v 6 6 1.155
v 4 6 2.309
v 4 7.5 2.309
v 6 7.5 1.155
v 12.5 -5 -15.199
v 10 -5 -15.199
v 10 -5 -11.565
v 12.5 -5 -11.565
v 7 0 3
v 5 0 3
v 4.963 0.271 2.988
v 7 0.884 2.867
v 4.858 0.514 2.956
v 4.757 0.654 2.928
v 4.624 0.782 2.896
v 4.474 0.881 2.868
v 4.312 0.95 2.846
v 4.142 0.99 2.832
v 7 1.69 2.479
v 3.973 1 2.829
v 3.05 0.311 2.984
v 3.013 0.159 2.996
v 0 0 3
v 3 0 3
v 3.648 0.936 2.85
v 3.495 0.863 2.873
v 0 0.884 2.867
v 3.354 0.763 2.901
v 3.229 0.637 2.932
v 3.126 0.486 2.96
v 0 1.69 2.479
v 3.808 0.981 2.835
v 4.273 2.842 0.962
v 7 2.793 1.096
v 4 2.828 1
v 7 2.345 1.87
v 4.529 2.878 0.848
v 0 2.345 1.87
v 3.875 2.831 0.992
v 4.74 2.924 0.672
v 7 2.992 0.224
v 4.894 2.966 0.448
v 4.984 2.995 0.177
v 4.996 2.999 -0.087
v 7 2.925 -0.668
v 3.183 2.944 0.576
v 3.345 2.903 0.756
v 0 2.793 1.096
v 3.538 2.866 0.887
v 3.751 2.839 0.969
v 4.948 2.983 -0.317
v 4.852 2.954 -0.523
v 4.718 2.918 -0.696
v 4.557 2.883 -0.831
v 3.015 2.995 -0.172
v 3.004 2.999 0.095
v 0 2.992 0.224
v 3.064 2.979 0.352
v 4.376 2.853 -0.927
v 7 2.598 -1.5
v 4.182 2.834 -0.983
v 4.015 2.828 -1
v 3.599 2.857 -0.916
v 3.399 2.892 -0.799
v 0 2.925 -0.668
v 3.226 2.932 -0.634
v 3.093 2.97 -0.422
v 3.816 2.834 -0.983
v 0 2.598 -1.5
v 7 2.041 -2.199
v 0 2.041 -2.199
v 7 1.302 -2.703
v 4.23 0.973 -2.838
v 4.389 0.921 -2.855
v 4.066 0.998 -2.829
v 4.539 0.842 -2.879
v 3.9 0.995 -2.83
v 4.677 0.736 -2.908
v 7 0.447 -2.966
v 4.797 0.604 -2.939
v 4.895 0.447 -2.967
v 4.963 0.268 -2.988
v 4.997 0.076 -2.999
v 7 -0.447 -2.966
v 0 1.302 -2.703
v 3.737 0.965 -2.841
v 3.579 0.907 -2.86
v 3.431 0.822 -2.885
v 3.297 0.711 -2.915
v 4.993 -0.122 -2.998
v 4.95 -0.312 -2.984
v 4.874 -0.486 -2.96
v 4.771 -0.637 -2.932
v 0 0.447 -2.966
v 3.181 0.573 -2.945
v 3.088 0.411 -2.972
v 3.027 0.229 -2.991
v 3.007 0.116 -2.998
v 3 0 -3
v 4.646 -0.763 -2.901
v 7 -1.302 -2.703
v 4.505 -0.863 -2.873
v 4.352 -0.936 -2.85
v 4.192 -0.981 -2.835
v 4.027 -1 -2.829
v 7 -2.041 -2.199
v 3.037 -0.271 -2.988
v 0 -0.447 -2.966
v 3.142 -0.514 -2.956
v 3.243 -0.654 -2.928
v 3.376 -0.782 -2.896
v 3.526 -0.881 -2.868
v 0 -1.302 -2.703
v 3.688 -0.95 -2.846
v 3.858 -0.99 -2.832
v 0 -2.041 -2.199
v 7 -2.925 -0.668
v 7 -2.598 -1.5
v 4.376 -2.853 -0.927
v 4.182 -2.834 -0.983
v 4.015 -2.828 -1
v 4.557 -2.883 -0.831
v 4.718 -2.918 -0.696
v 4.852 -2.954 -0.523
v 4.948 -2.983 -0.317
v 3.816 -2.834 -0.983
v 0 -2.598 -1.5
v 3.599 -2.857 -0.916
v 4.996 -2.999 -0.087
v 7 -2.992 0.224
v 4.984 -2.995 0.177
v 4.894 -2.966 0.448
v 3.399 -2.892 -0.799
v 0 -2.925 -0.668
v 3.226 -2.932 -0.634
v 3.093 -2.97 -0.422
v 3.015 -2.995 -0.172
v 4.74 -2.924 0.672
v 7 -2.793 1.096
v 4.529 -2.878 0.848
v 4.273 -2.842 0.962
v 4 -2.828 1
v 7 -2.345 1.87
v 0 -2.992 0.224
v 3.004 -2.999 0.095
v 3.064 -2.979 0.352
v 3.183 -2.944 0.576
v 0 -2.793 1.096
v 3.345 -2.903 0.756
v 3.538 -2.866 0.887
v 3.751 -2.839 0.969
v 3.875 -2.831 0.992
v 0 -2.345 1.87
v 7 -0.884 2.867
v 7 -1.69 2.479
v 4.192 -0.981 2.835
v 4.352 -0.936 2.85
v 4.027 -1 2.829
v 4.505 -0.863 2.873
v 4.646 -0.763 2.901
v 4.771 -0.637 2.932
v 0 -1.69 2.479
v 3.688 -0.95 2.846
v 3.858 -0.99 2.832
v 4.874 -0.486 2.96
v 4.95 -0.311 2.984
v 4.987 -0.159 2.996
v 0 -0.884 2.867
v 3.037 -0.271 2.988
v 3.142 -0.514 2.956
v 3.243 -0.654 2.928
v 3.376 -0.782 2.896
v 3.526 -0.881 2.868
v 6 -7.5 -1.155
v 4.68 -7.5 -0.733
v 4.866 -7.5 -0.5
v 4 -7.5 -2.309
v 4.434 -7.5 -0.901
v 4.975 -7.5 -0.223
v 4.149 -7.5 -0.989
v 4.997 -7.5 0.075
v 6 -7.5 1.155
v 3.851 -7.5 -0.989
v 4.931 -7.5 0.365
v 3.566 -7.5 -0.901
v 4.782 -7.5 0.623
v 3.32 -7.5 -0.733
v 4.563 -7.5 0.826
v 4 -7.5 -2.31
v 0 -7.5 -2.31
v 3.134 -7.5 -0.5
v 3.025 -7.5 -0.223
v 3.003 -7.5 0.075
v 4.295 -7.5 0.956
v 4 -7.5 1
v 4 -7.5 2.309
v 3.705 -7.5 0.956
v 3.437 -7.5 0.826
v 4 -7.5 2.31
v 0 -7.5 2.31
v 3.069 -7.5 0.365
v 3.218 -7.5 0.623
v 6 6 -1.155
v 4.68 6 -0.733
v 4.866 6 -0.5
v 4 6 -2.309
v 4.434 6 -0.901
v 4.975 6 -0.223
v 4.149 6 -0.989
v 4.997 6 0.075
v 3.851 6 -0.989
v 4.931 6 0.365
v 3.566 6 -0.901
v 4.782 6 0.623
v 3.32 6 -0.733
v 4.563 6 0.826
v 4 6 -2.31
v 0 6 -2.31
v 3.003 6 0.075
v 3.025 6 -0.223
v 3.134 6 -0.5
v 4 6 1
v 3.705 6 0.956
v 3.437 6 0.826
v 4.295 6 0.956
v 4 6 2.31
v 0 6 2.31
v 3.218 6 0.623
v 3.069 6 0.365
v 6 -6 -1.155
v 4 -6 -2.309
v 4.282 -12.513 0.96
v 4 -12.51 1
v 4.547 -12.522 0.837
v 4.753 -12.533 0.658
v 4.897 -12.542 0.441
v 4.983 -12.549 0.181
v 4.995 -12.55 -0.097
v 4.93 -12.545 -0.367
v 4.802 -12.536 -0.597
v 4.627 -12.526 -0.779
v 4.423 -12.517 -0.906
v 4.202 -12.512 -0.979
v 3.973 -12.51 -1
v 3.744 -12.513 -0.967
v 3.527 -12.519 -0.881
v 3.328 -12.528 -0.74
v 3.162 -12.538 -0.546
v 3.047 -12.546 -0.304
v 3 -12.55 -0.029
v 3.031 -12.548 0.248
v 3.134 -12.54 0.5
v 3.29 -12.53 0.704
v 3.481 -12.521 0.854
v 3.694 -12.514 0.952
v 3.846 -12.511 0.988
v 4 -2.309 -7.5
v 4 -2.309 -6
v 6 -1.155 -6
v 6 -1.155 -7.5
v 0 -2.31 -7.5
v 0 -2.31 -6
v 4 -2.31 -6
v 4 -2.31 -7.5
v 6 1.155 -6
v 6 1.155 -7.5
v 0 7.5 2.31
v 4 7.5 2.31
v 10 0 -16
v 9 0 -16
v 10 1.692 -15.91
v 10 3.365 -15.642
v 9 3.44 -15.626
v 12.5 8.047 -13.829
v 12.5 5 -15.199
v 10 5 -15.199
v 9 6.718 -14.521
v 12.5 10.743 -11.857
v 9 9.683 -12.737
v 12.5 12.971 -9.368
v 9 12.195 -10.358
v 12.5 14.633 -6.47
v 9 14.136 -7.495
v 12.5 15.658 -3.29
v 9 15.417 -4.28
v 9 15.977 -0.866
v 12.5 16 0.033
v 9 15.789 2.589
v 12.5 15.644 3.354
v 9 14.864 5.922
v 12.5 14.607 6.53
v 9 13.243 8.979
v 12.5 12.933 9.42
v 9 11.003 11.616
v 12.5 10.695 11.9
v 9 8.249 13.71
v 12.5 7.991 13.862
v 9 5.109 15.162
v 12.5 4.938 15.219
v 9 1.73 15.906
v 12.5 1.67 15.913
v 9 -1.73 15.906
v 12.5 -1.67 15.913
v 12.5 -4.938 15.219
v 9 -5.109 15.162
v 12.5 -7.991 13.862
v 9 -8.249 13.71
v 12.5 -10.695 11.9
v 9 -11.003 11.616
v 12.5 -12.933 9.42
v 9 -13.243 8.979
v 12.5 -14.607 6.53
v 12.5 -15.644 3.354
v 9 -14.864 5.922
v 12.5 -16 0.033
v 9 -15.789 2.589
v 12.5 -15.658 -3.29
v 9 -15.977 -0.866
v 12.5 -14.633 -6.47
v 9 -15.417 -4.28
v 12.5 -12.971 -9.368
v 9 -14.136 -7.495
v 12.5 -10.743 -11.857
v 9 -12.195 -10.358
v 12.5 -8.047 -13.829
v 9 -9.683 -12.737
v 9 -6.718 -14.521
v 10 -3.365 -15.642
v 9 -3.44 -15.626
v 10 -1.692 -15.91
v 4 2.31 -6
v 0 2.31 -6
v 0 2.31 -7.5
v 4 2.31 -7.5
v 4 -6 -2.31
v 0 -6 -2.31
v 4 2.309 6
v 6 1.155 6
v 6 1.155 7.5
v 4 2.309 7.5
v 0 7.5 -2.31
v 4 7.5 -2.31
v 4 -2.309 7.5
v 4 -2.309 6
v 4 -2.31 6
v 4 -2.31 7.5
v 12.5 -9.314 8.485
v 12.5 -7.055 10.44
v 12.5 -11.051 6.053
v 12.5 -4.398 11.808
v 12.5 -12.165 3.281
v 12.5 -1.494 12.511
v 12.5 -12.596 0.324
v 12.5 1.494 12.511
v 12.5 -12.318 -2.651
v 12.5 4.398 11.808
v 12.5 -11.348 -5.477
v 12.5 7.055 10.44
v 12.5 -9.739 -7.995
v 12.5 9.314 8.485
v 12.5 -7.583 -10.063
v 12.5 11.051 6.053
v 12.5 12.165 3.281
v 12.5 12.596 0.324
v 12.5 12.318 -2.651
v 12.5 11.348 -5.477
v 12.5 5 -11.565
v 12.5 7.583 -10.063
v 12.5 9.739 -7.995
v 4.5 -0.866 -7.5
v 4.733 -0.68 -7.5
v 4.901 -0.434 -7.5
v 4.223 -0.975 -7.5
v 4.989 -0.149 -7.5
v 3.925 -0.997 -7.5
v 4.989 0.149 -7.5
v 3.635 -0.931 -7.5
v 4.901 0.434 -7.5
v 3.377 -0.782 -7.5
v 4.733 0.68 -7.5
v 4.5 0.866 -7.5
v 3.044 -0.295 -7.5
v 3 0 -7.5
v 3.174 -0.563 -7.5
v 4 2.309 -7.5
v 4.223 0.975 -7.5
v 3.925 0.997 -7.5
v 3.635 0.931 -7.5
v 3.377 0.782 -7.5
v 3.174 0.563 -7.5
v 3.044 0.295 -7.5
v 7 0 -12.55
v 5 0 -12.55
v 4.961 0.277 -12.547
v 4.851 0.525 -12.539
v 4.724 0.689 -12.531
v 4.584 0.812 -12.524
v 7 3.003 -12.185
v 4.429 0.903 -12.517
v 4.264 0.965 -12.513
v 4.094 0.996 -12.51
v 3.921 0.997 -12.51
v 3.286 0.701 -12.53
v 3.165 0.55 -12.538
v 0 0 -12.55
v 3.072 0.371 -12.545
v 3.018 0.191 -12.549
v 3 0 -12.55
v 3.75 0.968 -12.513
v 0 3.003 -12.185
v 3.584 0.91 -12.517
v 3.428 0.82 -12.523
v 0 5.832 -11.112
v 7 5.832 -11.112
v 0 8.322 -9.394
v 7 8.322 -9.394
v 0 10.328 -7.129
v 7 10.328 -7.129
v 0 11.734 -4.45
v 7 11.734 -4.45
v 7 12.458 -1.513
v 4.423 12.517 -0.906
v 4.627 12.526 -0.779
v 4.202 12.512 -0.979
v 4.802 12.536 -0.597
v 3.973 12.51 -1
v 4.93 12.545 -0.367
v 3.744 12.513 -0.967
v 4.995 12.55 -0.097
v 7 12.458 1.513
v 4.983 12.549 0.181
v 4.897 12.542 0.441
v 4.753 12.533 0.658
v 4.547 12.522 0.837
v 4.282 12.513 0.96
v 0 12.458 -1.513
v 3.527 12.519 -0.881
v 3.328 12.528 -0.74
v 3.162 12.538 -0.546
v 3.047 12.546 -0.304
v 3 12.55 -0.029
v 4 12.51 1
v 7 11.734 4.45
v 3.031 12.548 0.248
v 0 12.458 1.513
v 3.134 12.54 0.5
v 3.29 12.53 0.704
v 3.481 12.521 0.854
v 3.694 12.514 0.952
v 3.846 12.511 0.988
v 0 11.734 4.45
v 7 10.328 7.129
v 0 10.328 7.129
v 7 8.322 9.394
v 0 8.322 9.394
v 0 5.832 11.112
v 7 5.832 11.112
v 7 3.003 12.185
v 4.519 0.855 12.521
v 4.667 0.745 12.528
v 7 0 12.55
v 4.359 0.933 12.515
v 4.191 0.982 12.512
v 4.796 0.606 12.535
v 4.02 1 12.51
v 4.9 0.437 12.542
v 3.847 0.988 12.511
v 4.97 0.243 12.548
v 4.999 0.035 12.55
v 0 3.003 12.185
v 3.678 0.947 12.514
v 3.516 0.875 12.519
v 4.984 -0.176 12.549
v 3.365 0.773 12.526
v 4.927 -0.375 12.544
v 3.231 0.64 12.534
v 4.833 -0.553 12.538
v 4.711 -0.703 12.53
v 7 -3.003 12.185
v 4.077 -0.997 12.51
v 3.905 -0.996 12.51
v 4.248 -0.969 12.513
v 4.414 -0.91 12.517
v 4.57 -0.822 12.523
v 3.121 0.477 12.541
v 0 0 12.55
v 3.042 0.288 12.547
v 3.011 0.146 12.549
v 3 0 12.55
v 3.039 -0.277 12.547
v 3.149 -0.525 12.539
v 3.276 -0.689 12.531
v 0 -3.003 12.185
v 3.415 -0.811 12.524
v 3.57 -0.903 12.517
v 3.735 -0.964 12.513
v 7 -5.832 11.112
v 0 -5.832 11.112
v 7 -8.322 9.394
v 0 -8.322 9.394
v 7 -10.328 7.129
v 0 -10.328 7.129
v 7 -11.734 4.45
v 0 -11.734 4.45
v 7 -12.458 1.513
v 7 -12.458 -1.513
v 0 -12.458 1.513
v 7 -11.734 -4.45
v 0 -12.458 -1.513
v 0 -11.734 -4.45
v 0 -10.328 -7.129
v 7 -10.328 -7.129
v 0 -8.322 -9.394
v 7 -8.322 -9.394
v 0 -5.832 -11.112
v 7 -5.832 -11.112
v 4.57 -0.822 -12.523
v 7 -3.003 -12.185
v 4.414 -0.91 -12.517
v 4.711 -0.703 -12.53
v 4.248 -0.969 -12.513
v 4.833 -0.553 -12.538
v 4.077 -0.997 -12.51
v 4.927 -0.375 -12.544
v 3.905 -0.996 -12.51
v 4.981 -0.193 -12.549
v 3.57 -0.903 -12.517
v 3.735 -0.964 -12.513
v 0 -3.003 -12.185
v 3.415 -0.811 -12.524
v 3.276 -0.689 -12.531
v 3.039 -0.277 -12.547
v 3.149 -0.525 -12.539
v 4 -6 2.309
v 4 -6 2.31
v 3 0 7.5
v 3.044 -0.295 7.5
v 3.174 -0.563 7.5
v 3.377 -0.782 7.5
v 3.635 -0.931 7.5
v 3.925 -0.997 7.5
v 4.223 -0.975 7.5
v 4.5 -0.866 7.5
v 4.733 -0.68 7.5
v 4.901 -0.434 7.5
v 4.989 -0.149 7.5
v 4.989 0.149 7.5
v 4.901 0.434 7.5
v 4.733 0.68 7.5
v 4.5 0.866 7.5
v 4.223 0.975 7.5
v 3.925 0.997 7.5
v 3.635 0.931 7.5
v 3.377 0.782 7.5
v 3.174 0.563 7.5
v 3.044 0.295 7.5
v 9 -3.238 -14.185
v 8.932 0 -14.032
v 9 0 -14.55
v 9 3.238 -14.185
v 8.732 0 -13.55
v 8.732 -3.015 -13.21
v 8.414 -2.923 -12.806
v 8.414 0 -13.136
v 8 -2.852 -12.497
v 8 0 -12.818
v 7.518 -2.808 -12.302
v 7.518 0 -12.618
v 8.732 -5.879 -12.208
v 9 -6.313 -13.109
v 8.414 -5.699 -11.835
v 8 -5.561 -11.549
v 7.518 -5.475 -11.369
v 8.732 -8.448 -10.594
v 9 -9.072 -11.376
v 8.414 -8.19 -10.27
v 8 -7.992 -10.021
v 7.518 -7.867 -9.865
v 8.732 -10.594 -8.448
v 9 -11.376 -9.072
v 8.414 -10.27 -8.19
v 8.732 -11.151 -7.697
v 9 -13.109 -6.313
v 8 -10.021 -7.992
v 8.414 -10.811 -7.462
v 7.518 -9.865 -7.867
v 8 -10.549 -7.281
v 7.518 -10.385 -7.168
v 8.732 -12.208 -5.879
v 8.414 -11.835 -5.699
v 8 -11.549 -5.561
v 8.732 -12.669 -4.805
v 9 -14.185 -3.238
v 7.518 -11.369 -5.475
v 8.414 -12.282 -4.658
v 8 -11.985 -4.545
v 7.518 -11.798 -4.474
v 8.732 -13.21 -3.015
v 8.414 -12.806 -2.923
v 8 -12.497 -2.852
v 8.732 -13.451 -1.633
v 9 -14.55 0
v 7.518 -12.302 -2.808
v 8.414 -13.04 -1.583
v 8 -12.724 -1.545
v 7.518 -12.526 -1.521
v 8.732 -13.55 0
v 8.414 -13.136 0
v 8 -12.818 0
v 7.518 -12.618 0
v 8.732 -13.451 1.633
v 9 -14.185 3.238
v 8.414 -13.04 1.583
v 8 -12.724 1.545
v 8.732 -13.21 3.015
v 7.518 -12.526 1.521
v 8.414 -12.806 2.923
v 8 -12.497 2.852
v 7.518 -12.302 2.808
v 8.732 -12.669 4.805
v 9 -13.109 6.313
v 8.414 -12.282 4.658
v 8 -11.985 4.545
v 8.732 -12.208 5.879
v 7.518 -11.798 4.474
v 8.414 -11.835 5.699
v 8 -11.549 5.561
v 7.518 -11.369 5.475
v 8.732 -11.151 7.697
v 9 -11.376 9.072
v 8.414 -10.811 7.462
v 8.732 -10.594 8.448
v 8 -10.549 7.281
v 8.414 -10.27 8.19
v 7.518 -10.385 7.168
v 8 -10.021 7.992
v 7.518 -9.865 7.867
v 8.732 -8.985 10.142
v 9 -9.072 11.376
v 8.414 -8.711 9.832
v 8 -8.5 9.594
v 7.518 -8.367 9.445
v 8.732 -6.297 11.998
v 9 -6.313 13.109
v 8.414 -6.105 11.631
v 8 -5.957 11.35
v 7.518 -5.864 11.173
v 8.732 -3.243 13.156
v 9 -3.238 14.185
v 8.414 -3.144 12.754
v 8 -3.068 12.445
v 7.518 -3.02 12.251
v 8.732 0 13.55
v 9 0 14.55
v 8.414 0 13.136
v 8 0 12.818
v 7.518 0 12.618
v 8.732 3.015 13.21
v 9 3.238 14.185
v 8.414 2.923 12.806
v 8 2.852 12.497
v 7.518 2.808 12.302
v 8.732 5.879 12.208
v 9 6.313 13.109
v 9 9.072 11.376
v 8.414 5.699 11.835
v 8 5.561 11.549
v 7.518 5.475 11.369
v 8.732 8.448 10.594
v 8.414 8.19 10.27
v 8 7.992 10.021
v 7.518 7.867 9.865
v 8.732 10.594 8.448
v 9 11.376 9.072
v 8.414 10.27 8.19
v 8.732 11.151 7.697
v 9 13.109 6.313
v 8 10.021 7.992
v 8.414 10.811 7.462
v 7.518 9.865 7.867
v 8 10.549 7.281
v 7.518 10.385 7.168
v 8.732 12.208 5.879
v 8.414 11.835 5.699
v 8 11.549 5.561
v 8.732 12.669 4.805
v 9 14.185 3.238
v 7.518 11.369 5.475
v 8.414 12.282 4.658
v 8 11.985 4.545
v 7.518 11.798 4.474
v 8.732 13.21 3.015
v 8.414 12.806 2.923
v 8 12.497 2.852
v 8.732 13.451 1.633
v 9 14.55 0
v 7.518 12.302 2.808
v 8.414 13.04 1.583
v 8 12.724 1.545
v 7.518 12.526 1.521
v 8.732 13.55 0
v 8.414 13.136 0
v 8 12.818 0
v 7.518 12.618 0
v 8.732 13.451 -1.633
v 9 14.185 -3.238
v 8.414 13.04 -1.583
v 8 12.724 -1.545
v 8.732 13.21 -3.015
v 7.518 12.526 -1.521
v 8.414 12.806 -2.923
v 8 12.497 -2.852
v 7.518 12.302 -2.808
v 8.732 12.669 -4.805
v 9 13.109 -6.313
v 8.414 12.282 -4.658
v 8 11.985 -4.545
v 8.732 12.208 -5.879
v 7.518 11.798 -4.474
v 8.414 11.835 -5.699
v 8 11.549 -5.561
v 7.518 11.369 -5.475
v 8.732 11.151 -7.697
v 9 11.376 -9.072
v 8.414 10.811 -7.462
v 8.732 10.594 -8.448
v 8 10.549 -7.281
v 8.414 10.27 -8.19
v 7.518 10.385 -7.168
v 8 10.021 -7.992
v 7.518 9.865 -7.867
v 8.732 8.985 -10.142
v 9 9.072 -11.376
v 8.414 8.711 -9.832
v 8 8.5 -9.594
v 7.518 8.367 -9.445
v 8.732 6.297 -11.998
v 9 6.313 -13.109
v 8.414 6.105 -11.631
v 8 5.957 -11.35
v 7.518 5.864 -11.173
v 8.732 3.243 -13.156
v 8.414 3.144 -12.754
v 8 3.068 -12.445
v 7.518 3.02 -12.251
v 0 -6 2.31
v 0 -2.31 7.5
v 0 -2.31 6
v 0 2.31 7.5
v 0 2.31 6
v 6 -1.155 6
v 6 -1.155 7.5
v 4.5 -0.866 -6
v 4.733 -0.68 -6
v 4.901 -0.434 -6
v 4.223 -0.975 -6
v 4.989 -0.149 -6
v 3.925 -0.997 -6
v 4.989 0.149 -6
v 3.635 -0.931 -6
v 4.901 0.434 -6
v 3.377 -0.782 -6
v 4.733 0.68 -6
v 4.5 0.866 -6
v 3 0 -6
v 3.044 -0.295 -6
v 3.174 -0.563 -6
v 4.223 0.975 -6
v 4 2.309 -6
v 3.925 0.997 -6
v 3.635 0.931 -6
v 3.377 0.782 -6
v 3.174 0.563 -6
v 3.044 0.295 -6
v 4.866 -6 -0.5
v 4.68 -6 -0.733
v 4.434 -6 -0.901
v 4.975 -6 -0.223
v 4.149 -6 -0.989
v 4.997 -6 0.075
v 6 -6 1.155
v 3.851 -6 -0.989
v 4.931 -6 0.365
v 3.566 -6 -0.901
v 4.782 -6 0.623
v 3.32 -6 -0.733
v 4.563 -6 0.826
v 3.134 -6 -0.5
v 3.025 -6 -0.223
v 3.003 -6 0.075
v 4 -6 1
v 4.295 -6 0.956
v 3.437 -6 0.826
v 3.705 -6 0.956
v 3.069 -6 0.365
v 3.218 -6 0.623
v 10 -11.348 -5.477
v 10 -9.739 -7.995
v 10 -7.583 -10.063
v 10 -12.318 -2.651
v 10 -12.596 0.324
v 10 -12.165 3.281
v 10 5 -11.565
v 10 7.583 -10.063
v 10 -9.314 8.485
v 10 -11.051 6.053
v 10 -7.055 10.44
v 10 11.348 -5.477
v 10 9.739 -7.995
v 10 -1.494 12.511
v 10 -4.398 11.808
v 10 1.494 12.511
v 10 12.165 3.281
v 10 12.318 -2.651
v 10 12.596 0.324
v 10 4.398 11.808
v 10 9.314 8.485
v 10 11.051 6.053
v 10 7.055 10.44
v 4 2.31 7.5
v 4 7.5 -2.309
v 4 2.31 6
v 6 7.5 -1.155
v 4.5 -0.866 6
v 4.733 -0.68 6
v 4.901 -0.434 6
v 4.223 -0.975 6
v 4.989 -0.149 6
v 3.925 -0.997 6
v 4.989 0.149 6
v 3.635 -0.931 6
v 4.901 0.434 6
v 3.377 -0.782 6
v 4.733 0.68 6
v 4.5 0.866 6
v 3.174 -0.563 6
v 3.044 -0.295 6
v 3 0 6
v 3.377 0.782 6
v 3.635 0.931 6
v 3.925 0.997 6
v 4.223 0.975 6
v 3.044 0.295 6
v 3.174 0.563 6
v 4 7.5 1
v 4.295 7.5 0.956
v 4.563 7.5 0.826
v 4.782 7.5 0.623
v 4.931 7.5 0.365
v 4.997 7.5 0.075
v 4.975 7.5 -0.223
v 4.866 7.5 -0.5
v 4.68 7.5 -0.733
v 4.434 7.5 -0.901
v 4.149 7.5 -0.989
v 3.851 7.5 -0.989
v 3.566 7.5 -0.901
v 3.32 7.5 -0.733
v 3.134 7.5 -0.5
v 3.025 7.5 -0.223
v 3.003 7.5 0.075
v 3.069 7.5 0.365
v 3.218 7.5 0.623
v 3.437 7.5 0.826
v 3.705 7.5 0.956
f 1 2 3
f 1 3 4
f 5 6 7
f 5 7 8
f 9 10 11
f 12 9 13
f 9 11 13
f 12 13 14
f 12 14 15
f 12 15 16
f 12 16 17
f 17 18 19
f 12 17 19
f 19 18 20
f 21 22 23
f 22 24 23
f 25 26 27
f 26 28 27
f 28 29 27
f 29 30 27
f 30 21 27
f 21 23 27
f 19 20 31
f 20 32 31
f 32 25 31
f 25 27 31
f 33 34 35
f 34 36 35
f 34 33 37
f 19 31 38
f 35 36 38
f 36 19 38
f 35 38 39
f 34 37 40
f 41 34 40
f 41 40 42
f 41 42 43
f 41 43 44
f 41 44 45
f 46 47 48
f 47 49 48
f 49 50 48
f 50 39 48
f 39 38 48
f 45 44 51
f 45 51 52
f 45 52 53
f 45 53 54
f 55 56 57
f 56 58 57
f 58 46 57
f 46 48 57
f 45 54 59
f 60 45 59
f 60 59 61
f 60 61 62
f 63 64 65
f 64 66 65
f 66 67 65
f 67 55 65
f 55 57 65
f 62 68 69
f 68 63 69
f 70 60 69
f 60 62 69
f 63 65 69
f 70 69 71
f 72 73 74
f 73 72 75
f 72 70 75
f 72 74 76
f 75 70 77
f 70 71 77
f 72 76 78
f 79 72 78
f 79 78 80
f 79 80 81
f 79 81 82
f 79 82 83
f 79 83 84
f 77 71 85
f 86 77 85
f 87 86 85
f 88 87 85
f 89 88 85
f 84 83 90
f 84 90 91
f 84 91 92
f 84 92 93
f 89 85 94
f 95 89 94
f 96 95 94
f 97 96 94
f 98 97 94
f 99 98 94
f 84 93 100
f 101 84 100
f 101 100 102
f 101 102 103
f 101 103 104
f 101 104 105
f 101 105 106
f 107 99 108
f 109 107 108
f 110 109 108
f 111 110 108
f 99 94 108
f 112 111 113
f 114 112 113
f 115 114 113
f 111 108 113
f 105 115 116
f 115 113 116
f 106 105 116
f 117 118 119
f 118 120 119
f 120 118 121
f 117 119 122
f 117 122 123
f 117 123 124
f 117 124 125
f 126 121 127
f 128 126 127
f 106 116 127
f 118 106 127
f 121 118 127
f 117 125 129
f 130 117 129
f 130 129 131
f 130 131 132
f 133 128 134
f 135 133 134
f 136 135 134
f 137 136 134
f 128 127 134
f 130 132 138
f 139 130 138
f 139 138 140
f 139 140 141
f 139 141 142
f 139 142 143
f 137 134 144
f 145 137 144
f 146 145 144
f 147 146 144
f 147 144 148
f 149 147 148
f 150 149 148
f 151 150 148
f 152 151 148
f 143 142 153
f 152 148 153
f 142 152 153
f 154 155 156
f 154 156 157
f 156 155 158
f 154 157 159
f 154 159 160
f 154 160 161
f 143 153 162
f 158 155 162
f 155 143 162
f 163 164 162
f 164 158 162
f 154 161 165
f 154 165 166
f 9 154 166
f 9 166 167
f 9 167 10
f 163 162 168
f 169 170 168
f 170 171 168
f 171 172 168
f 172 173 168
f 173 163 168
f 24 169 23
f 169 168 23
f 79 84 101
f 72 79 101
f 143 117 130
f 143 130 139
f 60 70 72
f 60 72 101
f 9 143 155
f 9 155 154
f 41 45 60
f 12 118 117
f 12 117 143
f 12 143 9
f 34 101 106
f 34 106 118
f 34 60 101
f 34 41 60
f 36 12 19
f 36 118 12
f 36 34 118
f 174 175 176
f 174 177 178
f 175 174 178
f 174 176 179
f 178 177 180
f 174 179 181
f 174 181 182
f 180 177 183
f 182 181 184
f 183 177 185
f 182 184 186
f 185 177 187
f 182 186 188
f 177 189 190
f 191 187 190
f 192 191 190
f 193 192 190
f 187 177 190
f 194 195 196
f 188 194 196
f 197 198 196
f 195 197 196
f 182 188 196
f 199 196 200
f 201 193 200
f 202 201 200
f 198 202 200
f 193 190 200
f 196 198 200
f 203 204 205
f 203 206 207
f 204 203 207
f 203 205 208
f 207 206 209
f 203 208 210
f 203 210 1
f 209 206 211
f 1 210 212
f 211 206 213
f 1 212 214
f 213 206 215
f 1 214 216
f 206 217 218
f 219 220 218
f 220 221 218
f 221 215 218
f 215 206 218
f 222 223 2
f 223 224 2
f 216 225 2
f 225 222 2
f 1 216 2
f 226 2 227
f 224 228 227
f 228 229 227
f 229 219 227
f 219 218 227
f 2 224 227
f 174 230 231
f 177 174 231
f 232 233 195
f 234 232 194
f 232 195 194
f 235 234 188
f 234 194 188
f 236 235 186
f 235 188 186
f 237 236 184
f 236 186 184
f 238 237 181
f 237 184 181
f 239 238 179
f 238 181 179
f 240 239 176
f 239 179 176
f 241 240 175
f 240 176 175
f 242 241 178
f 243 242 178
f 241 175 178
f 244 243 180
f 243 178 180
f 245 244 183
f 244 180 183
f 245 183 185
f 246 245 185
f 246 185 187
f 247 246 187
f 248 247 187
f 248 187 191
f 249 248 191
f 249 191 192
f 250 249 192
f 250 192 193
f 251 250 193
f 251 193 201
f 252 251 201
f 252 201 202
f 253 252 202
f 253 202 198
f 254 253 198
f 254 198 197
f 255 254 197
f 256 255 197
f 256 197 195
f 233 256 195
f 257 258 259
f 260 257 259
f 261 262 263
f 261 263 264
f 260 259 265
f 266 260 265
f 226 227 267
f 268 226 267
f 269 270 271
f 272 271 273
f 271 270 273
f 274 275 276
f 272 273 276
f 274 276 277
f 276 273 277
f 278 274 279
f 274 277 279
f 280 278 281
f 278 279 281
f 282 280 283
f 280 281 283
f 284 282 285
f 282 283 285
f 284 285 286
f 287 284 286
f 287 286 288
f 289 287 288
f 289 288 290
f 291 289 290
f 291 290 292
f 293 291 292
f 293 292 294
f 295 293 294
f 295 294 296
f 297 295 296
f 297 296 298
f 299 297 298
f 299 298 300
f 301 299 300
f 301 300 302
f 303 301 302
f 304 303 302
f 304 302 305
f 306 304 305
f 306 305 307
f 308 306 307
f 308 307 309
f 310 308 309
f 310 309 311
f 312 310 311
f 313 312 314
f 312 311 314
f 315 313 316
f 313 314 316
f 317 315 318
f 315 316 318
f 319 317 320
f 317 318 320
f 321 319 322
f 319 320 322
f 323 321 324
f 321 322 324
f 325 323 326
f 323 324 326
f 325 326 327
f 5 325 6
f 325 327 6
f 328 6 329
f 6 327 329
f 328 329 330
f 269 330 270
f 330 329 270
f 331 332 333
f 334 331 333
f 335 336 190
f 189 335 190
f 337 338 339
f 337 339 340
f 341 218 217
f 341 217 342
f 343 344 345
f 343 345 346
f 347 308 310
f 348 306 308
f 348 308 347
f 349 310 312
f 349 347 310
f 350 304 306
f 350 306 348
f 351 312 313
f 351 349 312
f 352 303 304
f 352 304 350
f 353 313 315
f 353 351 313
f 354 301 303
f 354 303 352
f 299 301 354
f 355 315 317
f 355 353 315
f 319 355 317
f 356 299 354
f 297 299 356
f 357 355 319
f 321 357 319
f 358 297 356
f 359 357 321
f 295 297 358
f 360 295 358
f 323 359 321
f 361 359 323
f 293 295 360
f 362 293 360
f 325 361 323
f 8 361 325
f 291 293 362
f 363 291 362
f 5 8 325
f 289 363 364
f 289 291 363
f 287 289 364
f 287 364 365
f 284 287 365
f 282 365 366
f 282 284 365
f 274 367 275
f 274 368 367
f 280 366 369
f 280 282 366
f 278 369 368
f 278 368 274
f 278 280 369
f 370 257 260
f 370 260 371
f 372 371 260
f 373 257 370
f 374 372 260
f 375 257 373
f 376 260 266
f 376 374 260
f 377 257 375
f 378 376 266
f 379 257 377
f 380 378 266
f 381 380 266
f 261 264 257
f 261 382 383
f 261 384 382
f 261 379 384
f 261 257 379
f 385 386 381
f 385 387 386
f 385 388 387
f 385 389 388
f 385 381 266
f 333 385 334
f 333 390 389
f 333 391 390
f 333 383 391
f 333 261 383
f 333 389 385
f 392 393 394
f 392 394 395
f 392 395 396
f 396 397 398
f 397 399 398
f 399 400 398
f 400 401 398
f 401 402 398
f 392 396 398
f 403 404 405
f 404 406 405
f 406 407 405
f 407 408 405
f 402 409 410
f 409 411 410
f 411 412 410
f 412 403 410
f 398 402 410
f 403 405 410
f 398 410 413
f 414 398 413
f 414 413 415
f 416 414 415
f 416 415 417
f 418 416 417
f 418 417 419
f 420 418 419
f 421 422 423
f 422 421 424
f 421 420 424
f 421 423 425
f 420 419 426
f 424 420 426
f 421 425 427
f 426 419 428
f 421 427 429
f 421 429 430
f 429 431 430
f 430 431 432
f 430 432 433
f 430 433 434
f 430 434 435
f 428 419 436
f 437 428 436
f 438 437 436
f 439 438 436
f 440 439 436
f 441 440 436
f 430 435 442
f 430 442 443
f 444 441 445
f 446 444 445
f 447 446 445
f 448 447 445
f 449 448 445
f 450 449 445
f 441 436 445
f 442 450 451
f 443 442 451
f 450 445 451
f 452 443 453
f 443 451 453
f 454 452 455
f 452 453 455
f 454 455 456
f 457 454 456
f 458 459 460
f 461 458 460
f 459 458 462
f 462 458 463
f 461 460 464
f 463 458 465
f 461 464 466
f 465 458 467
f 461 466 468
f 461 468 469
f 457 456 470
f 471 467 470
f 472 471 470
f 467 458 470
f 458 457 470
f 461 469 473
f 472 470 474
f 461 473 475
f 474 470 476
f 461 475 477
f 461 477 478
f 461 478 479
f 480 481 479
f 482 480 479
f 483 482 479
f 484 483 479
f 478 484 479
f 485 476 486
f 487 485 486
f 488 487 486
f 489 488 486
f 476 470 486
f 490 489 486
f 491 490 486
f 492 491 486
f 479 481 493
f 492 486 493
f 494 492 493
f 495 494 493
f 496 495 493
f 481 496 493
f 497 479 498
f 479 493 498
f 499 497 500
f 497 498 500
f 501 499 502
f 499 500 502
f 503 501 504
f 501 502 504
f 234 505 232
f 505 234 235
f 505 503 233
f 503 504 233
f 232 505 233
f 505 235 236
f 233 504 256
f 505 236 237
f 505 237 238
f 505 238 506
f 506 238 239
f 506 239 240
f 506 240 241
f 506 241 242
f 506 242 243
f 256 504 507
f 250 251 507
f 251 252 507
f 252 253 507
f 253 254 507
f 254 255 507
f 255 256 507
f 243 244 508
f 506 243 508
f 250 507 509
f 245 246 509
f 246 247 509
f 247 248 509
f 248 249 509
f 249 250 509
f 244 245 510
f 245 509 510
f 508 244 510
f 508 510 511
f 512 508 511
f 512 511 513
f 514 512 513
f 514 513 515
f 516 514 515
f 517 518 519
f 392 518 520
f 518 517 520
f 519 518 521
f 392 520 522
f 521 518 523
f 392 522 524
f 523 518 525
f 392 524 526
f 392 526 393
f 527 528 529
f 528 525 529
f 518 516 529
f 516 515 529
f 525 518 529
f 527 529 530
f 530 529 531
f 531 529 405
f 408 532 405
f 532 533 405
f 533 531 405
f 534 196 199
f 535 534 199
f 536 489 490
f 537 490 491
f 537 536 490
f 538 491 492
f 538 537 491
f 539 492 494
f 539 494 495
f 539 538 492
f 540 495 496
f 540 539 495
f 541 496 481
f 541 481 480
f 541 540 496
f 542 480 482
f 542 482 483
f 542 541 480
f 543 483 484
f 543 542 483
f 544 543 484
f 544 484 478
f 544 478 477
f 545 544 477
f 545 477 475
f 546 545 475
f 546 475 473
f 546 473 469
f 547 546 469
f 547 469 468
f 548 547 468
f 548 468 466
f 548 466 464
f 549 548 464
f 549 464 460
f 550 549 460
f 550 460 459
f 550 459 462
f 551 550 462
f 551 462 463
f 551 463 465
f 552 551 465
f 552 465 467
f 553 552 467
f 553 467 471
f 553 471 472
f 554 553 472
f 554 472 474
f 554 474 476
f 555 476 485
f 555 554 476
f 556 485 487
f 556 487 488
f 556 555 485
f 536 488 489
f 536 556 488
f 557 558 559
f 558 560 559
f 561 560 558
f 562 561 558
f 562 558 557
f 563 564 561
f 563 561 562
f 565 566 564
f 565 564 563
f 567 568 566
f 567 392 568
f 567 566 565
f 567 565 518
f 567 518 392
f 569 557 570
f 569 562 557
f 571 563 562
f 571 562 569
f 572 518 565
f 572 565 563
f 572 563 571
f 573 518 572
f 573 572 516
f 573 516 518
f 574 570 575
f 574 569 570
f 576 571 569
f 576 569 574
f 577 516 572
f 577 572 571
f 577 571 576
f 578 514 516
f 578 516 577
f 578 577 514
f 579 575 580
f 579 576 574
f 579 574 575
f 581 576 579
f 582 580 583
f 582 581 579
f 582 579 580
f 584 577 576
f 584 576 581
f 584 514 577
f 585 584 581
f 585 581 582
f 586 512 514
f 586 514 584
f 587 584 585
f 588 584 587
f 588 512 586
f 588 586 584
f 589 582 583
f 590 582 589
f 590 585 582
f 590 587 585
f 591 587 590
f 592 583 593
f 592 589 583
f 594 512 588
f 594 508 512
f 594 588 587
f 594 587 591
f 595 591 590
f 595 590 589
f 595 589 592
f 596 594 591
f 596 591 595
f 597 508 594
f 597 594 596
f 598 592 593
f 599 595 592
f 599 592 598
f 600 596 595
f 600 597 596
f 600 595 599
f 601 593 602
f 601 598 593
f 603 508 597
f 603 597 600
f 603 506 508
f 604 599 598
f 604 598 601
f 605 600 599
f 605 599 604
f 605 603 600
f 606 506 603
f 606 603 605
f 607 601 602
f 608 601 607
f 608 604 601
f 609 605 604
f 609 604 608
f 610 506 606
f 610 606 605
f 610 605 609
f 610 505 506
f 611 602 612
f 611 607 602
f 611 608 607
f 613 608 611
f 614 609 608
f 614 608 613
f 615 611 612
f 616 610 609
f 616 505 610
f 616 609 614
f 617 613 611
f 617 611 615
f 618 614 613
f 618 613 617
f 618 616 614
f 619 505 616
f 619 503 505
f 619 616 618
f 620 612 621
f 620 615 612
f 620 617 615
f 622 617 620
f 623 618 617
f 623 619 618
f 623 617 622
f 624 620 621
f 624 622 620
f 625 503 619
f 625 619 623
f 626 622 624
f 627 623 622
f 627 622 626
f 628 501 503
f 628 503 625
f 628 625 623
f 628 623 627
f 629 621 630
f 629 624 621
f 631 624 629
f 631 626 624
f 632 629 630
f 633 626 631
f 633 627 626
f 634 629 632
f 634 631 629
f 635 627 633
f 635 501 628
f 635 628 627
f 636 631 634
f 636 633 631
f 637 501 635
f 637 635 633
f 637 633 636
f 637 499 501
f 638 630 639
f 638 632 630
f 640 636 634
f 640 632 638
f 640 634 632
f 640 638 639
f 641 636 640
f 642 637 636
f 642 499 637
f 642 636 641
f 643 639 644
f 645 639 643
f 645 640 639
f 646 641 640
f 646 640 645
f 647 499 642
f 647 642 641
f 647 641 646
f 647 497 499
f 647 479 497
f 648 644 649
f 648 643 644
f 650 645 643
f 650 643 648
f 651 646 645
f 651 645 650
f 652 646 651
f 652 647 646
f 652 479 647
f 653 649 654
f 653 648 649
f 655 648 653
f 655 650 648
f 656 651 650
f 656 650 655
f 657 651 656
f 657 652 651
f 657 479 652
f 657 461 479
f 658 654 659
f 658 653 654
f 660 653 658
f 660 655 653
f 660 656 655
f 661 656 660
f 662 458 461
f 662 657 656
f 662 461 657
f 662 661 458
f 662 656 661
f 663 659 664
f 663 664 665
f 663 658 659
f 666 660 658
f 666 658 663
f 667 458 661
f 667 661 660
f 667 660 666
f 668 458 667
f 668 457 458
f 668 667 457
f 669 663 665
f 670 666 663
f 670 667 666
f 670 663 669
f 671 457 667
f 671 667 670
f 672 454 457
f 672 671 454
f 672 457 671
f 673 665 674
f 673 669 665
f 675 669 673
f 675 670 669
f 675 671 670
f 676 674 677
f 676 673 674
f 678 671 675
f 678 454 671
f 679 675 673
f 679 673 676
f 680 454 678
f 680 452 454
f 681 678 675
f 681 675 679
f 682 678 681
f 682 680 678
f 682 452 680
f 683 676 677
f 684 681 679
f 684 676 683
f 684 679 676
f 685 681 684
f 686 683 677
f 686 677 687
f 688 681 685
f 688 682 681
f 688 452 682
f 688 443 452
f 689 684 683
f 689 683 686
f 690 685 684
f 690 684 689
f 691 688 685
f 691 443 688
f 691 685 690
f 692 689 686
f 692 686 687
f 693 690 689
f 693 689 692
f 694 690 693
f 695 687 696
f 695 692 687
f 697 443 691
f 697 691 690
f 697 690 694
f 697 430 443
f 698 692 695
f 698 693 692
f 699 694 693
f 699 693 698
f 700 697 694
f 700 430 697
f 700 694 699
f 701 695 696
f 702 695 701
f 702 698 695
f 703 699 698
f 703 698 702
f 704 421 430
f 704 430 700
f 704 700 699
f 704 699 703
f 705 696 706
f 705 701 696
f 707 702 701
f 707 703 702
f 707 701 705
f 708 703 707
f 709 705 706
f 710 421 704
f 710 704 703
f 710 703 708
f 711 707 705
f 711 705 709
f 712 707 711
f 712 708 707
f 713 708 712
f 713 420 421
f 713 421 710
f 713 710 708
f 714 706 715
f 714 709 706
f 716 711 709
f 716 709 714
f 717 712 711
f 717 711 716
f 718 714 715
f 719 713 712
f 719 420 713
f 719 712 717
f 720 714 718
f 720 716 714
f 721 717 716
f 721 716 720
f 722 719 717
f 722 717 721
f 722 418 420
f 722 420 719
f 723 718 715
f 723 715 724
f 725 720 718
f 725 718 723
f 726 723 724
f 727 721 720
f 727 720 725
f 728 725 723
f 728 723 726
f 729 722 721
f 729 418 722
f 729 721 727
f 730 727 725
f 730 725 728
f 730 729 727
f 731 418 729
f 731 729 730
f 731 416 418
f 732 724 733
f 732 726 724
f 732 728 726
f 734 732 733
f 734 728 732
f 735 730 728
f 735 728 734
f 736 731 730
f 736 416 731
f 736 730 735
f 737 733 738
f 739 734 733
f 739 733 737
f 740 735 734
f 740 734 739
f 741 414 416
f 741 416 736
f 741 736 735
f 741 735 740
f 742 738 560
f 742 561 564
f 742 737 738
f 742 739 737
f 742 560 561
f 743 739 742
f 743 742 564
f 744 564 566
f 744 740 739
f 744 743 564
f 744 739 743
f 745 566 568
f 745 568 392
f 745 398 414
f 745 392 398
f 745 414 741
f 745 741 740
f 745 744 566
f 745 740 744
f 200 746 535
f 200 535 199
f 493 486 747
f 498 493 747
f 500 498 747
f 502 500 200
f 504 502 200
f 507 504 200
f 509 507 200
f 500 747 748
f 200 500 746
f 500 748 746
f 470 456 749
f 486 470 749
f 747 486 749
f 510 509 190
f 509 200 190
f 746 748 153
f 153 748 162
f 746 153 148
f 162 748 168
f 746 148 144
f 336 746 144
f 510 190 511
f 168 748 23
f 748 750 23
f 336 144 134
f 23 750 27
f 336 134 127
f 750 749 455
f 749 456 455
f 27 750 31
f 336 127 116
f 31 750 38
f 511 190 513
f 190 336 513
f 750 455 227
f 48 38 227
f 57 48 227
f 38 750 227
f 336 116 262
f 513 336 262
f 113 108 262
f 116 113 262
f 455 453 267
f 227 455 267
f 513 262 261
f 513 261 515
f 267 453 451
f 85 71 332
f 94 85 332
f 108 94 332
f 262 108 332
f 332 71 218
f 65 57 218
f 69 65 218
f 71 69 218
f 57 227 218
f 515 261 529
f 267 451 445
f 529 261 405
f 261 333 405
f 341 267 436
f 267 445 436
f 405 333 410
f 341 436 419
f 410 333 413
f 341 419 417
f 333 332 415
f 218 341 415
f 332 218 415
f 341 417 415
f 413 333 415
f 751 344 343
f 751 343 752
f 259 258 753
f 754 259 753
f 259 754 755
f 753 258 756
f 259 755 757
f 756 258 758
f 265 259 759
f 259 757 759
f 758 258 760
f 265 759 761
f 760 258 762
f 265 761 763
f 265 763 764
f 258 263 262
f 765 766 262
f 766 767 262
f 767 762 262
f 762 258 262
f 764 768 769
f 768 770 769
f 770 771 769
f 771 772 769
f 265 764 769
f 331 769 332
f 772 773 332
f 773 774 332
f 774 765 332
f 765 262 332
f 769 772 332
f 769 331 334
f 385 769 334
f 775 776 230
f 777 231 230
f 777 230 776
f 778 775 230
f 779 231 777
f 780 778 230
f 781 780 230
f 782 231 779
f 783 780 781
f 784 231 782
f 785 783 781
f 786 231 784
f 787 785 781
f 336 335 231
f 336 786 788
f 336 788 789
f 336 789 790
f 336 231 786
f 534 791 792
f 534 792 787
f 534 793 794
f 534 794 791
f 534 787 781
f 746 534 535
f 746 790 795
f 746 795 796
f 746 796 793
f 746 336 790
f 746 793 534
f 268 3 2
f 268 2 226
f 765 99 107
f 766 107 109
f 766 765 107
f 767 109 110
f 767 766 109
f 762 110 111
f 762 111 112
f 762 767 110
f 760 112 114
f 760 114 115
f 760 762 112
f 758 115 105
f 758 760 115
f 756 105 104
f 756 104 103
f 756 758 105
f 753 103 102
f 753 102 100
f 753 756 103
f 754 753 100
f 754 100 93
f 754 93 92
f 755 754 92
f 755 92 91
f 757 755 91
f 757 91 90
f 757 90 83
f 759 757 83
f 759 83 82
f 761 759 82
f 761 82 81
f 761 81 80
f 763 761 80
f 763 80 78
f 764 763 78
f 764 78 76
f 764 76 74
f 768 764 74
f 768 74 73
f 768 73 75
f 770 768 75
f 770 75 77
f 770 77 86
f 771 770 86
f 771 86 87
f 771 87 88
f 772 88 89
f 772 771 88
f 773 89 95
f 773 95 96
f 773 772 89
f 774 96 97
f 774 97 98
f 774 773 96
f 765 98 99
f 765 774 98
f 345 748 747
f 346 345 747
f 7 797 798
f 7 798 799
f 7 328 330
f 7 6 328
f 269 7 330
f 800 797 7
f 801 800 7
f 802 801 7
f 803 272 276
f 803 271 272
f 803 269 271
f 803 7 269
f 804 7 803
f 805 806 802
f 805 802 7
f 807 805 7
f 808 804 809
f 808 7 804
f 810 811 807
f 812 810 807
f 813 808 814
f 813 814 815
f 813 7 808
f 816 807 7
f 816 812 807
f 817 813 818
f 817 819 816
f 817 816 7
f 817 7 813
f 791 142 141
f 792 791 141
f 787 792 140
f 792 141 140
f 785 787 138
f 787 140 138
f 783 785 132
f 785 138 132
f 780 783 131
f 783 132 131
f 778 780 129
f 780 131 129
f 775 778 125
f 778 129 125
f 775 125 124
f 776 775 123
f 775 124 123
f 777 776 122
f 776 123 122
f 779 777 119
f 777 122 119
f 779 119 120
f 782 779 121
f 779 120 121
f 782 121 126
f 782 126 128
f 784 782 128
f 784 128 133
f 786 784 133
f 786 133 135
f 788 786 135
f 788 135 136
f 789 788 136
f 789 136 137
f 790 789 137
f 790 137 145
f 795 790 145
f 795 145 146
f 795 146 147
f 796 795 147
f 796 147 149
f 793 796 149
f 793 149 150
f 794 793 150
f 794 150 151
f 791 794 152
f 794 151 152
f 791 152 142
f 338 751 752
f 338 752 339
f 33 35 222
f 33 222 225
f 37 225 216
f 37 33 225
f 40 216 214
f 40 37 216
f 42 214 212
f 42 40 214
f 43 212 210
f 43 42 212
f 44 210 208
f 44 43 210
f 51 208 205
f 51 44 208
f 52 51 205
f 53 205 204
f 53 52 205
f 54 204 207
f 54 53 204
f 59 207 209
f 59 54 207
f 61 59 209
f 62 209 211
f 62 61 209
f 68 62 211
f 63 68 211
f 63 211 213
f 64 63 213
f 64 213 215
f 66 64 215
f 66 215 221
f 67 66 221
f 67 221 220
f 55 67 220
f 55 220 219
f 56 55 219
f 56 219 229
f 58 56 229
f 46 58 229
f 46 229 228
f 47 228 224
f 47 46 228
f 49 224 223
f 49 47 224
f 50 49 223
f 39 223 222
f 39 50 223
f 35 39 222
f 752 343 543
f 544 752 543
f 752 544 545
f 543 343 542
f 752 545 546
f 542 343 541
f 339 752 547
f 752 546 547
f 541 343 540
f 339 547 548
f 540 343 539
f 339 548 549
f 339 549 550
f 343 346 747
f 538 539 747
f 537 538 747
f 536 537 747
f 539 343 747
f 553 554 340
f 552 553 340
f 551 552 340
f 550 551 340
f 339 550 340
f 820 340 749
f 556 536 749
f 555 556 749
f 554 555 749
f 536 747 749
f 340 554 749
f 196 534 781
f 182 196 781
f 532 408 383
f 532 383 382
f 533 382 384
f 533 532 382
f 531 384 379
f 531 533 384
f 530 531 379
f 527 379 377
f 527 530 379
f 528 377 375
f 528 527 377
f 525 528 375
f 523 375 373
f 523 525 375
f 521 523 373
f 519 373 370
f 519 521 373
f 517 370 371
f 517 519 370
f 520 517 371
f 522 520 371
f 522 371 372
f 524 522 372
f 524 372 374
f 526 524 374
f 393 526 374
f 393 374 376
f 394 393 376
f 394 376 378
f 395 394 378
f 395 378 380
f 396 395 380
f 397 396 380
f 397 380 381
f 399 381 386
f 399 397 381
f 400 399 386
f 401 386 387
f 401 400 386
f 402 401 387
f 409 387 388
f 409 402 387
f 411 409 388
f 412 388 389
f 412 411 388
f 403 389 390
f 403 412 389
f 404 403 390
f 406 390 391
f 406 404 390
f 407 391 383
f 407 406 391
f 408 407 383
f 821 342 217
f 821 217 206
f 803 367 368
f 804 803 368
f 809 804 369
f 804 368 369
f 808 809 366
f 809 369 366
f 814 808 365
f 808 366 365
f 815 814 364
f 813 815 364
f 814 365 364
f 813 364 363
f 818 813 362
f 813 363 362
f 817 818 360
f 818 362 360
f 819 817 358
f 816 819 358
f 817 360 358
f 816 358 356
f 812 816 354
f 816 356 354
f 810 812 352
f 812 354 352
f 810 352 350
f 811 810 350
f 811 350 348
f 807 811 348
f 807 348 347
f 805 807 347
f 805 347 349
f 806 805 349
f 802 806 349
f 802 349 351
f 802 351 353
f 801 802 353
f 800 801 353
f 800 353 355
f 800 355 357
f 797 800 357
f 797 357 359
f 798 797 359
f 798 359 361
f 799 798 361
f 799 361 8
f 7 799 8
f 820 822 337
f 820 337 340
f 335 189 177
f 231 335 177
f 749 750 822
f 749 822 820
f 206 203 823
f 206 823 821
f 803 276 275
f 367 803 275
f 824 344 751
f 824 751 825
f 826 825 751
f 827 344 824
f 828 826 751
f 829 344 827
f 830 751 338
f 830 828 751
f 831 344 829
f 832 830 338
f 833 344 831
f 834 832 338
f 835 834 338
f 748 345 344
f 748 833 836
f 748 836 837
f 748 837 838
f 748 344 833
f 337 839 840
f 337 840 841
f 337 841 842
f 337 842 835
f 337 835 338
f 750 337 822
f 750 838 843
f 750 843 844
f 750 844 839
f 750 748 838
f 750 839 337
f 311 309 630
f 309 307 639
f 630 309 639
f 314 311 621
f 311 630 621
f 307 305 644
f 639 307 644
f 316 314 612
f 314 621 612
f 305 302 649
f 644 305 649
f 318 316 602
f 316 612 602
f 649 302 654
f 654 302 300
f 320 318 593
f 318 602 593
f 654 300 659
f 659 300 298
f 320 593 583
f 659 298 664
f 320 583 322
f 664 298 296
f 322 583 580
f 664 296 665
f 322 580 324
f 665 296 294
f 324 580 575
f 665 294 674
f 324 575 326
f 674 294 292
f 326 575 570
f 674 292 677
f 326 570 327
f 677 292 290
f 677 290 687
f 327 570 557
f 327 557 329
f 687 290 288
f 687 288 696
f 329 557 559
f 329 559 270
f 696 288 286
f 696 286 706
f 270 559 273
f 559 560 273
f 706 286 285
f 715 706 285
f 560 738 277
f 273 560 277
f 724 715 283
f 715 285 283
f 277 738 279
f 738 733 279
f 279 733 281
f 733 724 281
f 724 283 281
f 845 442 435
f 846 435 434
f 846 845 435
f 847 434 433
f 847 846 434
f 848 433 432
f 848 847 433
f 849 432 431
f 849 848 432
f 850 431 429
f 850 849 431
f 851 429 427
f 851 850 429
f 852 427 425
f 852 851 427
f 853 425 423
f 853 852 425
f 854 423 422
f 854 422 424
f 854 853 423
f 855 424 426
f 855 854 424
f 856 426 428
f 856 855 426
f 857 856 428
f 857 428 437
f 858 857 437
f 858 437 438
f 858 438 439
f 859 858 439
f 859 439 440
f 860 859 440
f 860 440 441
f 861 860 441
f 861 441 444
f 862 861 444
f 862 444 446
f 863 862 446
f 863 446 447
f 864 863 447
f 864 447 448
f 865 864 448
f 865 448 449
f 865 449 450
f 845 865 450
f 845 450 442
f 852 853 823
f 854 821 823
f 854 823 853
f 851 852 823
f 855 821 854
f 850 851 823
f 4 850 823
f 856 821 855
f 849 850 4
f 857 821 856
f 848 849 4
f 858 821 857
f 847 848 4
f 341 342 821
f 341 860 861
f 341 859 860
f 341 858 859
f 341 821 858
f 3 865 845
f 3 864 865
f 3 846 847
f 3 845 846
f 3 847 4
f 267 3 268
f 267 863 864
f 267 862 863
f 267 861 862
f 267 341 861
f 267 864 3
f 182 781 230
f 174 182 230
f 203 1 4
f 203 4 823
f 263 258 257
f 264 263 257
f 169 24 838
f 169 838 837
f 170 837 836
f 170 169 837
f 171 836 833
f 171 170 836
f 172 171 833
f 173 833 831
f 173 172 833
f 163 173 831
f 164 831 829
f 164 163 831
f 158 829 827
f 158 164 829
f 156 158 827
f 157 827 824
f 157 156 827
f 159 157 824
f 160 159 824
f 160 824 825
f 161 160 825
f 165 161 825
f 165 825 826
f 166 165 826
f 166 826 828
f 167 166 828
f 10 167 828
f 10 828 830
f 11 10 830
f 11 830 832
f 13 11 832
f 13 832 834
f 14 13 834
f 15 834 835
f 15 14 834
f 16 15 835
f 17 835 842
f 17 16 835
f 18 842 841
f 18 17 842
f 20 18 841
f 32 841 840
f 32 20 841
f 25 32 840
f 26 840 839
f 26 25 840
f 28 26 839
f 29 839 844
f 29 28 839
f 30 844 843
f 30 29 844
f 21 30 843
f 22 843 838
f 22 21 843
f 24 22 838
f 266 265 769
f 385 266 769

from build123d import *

# Parameters (mm, degrees)
SKETCH_1_R                      = 12.55
EXTRUDE_1_DEPTH                 = 10
SKETCH_2_R                      = 3
CUT_EXTRUDE_1_DEPTH             = 7
CUT_EXTRUDE_2_REACH             = 22.372
SKETCH_3_R                      = 1
CUT_EXTRUDE_2_DIRECTION_2_REACH = 22.372
CUT_EXTRUDE_3_DEPTH             = 21
CUT_EXTRUDE_3_DEPTH_BACK        = 19
SKETCH_4_R                      = 1
EXTRUDE_2_DEPTH                 = 2.5
EXTRUDE_2_DEPTH_BACK            = 1
SKETCH_5_R                      = 16
SKETCH_6_R                      = 12.6
CUT_EXTRUDE_4_DEPTH             = 2.5
FILLET_1_R                      = 2
SKETCH_7_W                      = 2.5
SKETCH_7_H                      = 10
CUT_EXTRUDE_5_DEPTH             = 21.5
CUT_EXTRUDE_7_DEPTH             = 1.5
SKETCH_13_W                     = 4.62
SKETCH_13_H                     = 1.5
CUT_EXTRUDE_8_DEPTH             = 4
SKETCH_14_W                     = 1.5
SKETCH_14_H                     = 4.62
CUT_EXTRUDE_9_DEPTH             = 4
CUT_EXTRUDE_10_DEPTH            = 1.5


with BuildPart() as part:
    # 草图1 → 凸台-拉伸1 (new body)
    with BuildSketch(Plane(origin=(0, 0, 0), x_dir=(0, 0, -1), z_dir=(1, 0, 0))):
        Circle(SKETCH_1_R)
    extrude(amount=EXTRUDE_1_DEPTH)

    # 草图2 → 切除-拉伸1 (cut)
    with BuildSketch(Plane.ZY):
        Circle(SKETCH_2_R)
    extrude(amount=-CUT_EXTRUDE_1_DEPTH, mode=Mode.SUBTRACT)

    # 草图3 → 切除-拉伸2 (cut, up to next)
    with BuildSketch(Plane(origin=(0, 0, 0), x_dir=(1, 0, 0), z_dir=(0, 1, 0)), mode=Mode.PRIVATE) as cut_extrude_2_sk1:
        with Locations(Location((4, 0, 0), (0, 0, 270))):
            Circle(SKETCH_3_R)
    cut_extrude_2_tool1 = extrude(cut_extrude_2_sk1.sketch, amount=-CUT_EXTRUDE_2_REACH, mode=Mode.PRIVATE) & part.part
    add(cut_extrude_2_tool1.solids().sort_by_distance((4, 0, 0))[0], mode=Mode.SUBTRACT)

    # 草图3 → 切除-拉伸2 direction 2 (cut, up to next)
    with BuildSketch(Plane(origin=(0, 0, 0), x_dir=(1, 0, 0), z_dir=(0, 1, 0)), mode=Mode.PRIVATE) as cut_extrude_2_direction_2_sk1:
        with Locations(Location((4, 0, 0), (0, 0, 270))):
            Circle(SKETCH_3_R)
    cut_extrude_2_direction_2_tool1 = extrude(cut_extrude_2_direction_2_sk1.sketch, amount=CUT_EXTRUDE_2_DIRECTION_2_REACH, mode=Mode.PRIVATE) & part.part
    add(cut_extrude_2_direction_2_tool1.solids().sort_by_distance((4, 0, 0))[0], mode=Mode.SUBTRACT)

    # 草图4 → 切除-拉伸3 (cut, two sides: drawn at the far end of the back side and taken through both)
    with BuildSketch(Plane.XY.offset(-CUT_EXTRUDE_3_DEPTH_BACK)):
        with Locations(Location((4, 0, 0), (0, 0, 180))):
            Circle(SKETCH_4_R)
    extrude(amount=CUT_EXTRUDE_3_DEPTH + CUT_EXTRUDE_3_DEPTH_BACK, mode=Mode.SUBTRACT)

    # 草图5 → 凸台-拉伸2 (add, two sides: drawn at the far end of the back side and taken through both)
    with BuildSketch(Plane(origin=(10, 0, 0), x_dir=(0, 0, -1), z_dir=(1, 0, 0)).offset(-EXTRUDE_2_DEPTH_BACK)):
        Circle(SKETCH_5_R)
    extrude(amount=EXTRUDE_2_DEPTH + EXTRUDE_2_DEPTH_BACK)

    # 草图6 → 切除-拉伸4 (cut)
    with BuildSketch(Plane(origin=(12.5, 0, 0), x_dir=(0, 0, -1), z_dir=(1, 0, 0))):
        Circle(SKETCH_6_R)
    extrude(amount=-CUT_EXTRUDE_4_DEPTH, mode=Mode.SUBTRACT)

    # 圆角1
    fillet_1_edges = [part.edges().sort_by_distance(p)[0] for p in [
        (9, 0, 12.55),
    ]]
    fillet(fillet_1_edges, radius=FILLET_1_R)

    # 草图7 → 切除-拉伸5 (cut)
    with BuildSketch(Plane.XY):
        with Locations((11.25, 0)):
            Rectangle(SKETCH_7_W, SKETCH_7_H)
    extrude(amount=-CUT_EXTRUDE_5_DEPTH, mode=Mode.SUBTRACT)

    # 草图11 → 切除-拉伸7 (cut)
    with BuildSketch(Plane(origin=(0, 6, 0), x_dir=(1, 0, 0), z_dir=(0, 1, 0))):
        Polygon((4, 2.309401077), (2, 1.154700538), (2, -1.154700538), (4, -2.309401077), (6, -1.154700538), (6, 1.154700538), align=None)
    cut_extrude_7 = extrude(amount=CUT_EXTRUDE_7_DEPTH, mode=Mode.SUBTRACT)

    # 草图13 → 切除-拉伸8 (cut)
    with BuildSketch(Plane.ZY):
        with Locations((0, 6.75)):
            Rectangle(SKETCH_13_W, SKETCH_13_H)
    cut_extrude_8 = extrude(amount=-CUT_EXTRUDE_8_DEPTH, mode=Mode.SUBTRACT)

    # 草图14 → 切除-拉伸9 (cut)
    with BuildSketch(Plane.ZY):
        with Locations((6.75, 0)):
            Rectangle(SKETCH_14_W, SKETCH_14_H)
    cut_extrude_9 = extrude(amount=-CUT_EXTRUDE_9_DEPTH, mode=Mode.SUBTRACT)

    # 草图9 → 切除-拉伸10 (cut)
    with BuildSketch(Plane.XY.offset(6)):
        Polygon((4, 2.309401077), (2, 1.154700538), (2, -1.154700538), (4, -2.309401077), (6, -1.154700538), (6, 1.154700538), align=None)
    cut_extrude_10 = extrude(amount=CUT_EXTRUDE_10_DEPTH, mode=Mode.SUBTRACT)

    # 镜向1: 切除-拉伸9, 切除-拉伸10 across plane
    add(cut_extrude_9.mirror(Plane.XY), mode=Mode.SUBTRACT)
    add(cut_extrude_10.mirror(Plane.XY), mode=Mode.SUBTRACT)

    # 镜向2: 切除-拉伸7, 切除-拉伸8 across plane
    add(cut_extrude_7.mirror(Plane.ZX), mode=Mode.SUBTRACT)
    add(cut_extrude_8.mirror(Plane.ZX), mode=Mode.SUBTRACT)


solid = part.part
